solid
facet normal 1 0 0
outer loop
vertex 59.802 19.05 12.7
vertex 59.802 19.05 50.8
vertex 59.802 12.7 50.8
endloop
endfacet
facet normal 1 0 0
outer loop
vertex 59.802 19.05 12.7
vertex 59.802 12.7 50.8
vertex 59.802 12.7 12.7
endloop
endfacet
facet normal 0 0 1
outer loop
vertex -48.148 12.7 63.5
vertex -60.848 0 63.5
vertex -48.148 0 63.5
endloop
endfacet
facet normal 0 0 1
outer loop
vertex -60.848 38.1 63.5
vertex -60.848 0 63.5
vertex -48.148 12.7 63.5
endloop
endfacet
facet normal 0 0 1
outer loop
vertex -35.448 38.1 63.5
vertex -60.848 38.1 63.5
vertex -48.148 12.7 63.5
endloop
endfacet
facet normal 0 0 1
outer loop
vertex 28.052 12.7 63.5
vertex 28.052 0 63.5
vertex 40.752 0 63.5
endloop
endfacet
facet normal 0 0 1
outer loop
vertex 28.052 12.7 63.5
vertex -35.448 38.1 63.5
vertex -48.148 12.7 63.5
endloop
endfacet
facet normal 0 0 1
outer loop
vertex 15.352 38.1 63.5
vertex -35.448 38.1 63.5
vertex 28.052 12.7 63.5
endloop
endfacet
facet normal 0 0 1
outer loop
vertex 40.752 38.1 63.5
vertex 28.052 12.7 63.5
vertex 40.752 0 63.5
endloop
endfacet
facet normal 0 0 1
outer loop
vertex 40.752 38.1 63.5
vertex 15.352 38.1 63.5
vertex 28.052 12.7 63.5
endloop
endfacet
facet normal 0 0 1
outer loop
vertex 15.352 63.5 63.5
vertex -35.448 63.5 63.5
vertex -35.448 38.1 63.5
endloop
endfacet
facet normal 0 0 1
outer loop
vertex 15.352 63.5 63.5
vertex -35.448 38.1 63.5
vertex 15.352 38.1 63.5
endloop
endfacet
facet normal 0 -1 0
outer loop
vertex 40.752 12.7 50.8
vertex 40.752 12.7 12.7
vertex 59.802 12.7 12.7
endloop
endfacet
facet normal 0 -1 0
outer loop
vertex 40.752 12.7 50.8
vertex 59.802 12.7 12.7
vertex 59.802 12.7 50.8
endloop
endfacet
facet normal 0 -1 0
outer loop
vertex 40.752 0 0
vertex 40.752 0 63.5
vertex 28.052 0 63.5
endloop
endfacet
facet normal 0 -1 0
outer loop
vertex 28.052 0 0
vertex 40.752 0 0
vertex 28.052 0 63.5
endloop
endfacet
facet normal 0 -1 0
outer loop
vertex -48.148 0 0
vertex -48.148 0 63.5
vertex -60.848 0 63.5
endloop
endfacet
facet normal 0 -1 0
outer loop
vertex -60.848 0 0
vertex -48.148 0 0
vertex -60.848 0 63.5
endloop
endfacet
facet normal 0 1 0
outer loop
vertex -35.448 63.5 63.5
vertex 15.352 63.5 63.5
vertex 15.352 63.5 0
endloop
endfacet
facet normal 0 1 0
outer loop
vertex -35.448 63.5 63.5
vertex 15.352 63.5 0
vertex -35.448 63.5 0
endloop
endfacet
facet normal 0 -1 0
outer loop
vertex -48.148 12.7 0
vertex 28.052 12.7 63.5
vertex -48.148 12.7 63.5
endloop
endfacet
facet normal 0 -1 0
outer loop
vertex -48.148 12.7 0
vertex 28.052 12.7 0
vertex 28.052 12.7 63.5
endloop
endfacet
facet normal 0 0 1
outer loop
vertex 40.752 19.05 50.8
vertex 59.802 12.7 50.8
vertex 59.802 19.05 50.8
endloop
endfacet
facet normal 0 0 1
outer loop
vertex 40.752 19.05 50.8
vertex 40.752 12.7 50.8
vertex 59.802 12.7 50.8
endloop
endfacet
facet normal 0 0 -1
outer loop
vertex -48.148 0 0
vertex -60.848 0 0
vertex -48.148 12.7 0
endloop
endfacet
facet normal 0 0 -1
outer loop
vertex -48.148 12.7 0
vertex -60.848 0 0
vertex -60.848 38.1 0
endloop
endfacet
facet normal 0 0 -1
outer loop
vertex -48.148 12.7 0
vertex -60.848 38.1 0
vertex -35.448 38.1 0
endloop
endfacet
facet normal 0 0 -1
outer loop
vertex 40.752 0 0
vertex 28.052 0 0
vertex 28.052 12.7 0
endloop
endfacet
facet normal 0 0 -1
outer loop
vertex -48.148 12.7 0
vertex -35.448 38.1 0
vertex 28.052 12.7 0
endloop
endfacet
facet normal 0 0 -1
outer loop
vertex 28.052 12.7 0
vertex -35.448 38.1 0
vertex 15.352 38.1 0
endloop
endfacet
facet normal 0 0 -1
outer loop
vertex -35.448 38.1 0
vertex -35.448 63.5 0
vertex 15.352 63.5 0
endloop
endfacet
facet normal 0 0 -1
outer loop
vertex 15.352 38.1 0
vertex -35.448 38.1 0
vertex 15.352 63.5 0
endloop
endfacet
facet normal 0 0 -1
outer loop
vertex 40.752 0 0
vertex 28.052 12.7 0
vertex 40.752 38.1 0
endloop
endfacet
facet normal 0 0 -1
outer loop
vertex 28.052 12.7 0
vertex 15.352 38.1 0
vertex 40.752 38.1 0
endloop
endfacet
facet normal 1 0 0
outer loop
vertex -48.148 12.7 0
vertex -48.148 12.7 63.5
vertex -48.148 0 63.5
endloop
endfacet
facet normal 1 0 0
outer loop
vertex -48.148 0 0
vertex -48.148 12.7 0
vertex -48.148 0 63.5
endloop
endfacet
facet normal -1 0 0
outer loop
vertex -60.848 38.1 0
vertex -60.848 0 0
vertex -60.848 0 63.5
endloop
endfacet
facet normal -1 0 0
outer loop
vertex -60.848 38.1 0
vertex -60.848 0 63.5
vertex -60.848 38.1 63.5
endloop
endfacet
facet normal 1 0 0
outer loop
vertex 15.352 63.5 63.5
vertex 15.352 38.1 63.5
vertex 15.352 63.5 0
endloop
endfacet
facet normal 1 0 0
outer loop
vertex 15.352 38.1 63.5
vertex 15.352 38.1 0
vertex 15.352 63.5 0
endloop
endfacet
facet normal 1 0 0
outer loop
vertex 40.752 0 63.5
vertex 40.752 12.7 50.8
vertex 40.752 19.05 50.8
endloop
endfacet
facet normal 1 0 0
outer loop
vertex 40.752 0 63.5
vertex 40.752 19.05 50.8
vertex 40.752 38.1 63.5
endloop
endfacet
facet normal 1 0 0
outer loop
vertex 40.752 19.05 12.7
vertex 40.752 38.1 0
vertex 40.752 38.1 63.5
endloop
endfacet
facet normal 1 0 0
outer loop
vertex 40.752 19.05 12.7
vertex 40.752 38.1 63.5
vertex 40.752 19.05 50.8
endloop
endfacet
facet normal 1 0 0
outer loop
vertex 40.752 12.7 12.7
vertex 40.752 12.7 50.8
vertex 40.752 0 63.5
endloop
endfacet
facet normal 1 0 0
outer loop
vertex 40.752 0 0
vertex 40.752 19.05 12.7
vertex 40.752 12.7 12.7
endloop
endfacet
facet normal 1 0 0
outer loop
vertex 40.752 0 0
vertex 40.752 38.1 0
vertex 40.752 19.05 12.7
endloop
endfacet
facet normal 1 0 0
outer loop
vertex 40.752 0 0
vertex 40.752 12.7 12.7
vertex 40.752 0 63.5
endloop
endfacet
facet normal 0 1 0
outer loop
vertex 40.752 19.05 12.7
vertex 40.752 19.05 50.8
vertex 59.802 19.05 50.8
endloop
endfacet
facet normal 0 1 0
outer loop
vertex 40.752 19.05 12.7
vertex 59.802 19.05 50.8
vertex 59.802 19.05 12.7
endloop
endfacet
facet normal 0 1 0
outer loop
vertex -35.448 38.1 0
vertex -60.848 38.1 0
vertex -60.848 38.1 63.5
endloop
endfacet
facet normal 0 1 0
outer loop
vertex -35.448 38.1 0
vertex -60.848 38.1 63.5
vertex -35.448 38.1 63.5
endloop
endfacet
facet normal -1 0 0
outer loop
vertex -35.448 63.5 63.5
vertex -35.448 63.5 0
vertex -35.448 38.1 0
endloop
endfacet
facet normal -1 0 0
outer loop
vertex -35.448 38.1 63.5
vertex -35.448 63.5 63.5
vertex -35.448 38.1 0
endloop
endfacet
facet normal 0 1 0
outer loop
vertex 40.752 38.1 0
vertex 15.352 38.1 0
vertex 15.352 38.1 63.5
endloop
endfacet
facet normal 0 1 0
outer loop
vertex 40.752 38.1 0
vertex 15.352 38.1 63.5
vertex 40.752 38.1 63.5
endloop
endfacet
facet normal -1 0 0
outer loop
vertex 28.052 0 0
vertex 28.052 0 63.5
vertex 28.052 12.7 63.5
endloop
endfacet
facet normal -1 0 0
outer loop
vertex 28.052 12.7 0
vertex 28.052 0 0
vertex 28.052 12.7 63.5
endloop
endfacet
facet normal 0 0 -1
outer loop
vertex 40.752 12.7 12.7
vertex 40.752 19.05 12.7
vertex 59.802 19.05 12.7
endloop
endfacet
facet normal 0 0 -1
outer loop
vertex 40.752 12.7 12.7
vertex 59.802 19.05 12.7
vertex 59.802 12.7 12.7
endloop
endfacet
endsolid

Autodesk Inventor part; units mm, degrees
ref_plane "YZ Plane" through (0, 0, 0) normal (1, 0, 0) x (0, 1, 0)
ref_plane "XZ Plane" through (0, 0, 0) normal (0, 1, 0) x (-1, 0, 0)
ref_plane "XY Plane" through (0, 0, 0) normal (0, 0, 1) x (1, 0, 0)
sketch "Sketch1" plane through (0, 0, 0) normal (0, 0, 1) x (1, 0, 0)
  line L0 (40.7521, 38.1) -> (40.7521, 0)
  line L1 (-60.8479, 0) -> (-60.8479, 38.1)
  line L2 (15.3521, 38.1) -> (15.3521, 63.5)
  line L3 (15.3521, 63.5) -> (-35.4479, 63.5)
  line L4 (-35.4479, 63.5) -> (-35.4479, 38.1)
  line L5 (28.0521, 0) -> (28.0521, 12.7)
  line L6 (28.0521, 12.7) -> (-48.1479, 12.7)
  line L7 (-48.1479, 12.7) -> (-48.1479, 0)
  line L8 (40.7521, 0) -> (28.0521, 0)
  line L9 (-48.1479, 0) -> (-60.8479, 0)
  line L10 (-60.8479, 38.1) -> (-35.4479, 38.1)
  line L11 (15.3521, 38.1) -> (40.7521, 38.1)
  point P0 (0, 0)
  dimension "d4" = 101.6
  dimension "d5" = 12.7
  dimension "d6" = 12.7
  dimension "d7" = 12.7
  dimension "d8" = 38.1
  dimension "d9" = 25.4
  dimension "d10" = 25.4
  dimension "d11" = 25.4
  dimension "d12" = 25.4
  dimension "d13" = 50.8
extrude "Extrusion1" add sketch "Sketch1" along normal blind 63.5
sketch "Sketch2" plane through (40.7521, 0, 0) normal (1, 0, 0) x (0, 0, -1)
  line L0 (-50.8, 19.05) -> (-12.7, 19.05)
  line L1 (-12.7, 19.05) -> (-12.7, 12.7)
  line L2 (-12.7, 12.7) -> (-50.8, 12.7)
  line L3 (-50.8, 12.7) -> (-50.8, 19.05)
  line L4 (0, 0) -> (0, 38.1) projected
  line L5 (0, 38.1) -> (-63.5, 38.1) projected
  dimension "d16" = 38.1
  dimension "d17" = 12.7
  dimension "d18" = 6.35
  dimension "d19" = 19.05
extrude "Extrusion2" add sketch "Sketch2" along normal blind 19.05
